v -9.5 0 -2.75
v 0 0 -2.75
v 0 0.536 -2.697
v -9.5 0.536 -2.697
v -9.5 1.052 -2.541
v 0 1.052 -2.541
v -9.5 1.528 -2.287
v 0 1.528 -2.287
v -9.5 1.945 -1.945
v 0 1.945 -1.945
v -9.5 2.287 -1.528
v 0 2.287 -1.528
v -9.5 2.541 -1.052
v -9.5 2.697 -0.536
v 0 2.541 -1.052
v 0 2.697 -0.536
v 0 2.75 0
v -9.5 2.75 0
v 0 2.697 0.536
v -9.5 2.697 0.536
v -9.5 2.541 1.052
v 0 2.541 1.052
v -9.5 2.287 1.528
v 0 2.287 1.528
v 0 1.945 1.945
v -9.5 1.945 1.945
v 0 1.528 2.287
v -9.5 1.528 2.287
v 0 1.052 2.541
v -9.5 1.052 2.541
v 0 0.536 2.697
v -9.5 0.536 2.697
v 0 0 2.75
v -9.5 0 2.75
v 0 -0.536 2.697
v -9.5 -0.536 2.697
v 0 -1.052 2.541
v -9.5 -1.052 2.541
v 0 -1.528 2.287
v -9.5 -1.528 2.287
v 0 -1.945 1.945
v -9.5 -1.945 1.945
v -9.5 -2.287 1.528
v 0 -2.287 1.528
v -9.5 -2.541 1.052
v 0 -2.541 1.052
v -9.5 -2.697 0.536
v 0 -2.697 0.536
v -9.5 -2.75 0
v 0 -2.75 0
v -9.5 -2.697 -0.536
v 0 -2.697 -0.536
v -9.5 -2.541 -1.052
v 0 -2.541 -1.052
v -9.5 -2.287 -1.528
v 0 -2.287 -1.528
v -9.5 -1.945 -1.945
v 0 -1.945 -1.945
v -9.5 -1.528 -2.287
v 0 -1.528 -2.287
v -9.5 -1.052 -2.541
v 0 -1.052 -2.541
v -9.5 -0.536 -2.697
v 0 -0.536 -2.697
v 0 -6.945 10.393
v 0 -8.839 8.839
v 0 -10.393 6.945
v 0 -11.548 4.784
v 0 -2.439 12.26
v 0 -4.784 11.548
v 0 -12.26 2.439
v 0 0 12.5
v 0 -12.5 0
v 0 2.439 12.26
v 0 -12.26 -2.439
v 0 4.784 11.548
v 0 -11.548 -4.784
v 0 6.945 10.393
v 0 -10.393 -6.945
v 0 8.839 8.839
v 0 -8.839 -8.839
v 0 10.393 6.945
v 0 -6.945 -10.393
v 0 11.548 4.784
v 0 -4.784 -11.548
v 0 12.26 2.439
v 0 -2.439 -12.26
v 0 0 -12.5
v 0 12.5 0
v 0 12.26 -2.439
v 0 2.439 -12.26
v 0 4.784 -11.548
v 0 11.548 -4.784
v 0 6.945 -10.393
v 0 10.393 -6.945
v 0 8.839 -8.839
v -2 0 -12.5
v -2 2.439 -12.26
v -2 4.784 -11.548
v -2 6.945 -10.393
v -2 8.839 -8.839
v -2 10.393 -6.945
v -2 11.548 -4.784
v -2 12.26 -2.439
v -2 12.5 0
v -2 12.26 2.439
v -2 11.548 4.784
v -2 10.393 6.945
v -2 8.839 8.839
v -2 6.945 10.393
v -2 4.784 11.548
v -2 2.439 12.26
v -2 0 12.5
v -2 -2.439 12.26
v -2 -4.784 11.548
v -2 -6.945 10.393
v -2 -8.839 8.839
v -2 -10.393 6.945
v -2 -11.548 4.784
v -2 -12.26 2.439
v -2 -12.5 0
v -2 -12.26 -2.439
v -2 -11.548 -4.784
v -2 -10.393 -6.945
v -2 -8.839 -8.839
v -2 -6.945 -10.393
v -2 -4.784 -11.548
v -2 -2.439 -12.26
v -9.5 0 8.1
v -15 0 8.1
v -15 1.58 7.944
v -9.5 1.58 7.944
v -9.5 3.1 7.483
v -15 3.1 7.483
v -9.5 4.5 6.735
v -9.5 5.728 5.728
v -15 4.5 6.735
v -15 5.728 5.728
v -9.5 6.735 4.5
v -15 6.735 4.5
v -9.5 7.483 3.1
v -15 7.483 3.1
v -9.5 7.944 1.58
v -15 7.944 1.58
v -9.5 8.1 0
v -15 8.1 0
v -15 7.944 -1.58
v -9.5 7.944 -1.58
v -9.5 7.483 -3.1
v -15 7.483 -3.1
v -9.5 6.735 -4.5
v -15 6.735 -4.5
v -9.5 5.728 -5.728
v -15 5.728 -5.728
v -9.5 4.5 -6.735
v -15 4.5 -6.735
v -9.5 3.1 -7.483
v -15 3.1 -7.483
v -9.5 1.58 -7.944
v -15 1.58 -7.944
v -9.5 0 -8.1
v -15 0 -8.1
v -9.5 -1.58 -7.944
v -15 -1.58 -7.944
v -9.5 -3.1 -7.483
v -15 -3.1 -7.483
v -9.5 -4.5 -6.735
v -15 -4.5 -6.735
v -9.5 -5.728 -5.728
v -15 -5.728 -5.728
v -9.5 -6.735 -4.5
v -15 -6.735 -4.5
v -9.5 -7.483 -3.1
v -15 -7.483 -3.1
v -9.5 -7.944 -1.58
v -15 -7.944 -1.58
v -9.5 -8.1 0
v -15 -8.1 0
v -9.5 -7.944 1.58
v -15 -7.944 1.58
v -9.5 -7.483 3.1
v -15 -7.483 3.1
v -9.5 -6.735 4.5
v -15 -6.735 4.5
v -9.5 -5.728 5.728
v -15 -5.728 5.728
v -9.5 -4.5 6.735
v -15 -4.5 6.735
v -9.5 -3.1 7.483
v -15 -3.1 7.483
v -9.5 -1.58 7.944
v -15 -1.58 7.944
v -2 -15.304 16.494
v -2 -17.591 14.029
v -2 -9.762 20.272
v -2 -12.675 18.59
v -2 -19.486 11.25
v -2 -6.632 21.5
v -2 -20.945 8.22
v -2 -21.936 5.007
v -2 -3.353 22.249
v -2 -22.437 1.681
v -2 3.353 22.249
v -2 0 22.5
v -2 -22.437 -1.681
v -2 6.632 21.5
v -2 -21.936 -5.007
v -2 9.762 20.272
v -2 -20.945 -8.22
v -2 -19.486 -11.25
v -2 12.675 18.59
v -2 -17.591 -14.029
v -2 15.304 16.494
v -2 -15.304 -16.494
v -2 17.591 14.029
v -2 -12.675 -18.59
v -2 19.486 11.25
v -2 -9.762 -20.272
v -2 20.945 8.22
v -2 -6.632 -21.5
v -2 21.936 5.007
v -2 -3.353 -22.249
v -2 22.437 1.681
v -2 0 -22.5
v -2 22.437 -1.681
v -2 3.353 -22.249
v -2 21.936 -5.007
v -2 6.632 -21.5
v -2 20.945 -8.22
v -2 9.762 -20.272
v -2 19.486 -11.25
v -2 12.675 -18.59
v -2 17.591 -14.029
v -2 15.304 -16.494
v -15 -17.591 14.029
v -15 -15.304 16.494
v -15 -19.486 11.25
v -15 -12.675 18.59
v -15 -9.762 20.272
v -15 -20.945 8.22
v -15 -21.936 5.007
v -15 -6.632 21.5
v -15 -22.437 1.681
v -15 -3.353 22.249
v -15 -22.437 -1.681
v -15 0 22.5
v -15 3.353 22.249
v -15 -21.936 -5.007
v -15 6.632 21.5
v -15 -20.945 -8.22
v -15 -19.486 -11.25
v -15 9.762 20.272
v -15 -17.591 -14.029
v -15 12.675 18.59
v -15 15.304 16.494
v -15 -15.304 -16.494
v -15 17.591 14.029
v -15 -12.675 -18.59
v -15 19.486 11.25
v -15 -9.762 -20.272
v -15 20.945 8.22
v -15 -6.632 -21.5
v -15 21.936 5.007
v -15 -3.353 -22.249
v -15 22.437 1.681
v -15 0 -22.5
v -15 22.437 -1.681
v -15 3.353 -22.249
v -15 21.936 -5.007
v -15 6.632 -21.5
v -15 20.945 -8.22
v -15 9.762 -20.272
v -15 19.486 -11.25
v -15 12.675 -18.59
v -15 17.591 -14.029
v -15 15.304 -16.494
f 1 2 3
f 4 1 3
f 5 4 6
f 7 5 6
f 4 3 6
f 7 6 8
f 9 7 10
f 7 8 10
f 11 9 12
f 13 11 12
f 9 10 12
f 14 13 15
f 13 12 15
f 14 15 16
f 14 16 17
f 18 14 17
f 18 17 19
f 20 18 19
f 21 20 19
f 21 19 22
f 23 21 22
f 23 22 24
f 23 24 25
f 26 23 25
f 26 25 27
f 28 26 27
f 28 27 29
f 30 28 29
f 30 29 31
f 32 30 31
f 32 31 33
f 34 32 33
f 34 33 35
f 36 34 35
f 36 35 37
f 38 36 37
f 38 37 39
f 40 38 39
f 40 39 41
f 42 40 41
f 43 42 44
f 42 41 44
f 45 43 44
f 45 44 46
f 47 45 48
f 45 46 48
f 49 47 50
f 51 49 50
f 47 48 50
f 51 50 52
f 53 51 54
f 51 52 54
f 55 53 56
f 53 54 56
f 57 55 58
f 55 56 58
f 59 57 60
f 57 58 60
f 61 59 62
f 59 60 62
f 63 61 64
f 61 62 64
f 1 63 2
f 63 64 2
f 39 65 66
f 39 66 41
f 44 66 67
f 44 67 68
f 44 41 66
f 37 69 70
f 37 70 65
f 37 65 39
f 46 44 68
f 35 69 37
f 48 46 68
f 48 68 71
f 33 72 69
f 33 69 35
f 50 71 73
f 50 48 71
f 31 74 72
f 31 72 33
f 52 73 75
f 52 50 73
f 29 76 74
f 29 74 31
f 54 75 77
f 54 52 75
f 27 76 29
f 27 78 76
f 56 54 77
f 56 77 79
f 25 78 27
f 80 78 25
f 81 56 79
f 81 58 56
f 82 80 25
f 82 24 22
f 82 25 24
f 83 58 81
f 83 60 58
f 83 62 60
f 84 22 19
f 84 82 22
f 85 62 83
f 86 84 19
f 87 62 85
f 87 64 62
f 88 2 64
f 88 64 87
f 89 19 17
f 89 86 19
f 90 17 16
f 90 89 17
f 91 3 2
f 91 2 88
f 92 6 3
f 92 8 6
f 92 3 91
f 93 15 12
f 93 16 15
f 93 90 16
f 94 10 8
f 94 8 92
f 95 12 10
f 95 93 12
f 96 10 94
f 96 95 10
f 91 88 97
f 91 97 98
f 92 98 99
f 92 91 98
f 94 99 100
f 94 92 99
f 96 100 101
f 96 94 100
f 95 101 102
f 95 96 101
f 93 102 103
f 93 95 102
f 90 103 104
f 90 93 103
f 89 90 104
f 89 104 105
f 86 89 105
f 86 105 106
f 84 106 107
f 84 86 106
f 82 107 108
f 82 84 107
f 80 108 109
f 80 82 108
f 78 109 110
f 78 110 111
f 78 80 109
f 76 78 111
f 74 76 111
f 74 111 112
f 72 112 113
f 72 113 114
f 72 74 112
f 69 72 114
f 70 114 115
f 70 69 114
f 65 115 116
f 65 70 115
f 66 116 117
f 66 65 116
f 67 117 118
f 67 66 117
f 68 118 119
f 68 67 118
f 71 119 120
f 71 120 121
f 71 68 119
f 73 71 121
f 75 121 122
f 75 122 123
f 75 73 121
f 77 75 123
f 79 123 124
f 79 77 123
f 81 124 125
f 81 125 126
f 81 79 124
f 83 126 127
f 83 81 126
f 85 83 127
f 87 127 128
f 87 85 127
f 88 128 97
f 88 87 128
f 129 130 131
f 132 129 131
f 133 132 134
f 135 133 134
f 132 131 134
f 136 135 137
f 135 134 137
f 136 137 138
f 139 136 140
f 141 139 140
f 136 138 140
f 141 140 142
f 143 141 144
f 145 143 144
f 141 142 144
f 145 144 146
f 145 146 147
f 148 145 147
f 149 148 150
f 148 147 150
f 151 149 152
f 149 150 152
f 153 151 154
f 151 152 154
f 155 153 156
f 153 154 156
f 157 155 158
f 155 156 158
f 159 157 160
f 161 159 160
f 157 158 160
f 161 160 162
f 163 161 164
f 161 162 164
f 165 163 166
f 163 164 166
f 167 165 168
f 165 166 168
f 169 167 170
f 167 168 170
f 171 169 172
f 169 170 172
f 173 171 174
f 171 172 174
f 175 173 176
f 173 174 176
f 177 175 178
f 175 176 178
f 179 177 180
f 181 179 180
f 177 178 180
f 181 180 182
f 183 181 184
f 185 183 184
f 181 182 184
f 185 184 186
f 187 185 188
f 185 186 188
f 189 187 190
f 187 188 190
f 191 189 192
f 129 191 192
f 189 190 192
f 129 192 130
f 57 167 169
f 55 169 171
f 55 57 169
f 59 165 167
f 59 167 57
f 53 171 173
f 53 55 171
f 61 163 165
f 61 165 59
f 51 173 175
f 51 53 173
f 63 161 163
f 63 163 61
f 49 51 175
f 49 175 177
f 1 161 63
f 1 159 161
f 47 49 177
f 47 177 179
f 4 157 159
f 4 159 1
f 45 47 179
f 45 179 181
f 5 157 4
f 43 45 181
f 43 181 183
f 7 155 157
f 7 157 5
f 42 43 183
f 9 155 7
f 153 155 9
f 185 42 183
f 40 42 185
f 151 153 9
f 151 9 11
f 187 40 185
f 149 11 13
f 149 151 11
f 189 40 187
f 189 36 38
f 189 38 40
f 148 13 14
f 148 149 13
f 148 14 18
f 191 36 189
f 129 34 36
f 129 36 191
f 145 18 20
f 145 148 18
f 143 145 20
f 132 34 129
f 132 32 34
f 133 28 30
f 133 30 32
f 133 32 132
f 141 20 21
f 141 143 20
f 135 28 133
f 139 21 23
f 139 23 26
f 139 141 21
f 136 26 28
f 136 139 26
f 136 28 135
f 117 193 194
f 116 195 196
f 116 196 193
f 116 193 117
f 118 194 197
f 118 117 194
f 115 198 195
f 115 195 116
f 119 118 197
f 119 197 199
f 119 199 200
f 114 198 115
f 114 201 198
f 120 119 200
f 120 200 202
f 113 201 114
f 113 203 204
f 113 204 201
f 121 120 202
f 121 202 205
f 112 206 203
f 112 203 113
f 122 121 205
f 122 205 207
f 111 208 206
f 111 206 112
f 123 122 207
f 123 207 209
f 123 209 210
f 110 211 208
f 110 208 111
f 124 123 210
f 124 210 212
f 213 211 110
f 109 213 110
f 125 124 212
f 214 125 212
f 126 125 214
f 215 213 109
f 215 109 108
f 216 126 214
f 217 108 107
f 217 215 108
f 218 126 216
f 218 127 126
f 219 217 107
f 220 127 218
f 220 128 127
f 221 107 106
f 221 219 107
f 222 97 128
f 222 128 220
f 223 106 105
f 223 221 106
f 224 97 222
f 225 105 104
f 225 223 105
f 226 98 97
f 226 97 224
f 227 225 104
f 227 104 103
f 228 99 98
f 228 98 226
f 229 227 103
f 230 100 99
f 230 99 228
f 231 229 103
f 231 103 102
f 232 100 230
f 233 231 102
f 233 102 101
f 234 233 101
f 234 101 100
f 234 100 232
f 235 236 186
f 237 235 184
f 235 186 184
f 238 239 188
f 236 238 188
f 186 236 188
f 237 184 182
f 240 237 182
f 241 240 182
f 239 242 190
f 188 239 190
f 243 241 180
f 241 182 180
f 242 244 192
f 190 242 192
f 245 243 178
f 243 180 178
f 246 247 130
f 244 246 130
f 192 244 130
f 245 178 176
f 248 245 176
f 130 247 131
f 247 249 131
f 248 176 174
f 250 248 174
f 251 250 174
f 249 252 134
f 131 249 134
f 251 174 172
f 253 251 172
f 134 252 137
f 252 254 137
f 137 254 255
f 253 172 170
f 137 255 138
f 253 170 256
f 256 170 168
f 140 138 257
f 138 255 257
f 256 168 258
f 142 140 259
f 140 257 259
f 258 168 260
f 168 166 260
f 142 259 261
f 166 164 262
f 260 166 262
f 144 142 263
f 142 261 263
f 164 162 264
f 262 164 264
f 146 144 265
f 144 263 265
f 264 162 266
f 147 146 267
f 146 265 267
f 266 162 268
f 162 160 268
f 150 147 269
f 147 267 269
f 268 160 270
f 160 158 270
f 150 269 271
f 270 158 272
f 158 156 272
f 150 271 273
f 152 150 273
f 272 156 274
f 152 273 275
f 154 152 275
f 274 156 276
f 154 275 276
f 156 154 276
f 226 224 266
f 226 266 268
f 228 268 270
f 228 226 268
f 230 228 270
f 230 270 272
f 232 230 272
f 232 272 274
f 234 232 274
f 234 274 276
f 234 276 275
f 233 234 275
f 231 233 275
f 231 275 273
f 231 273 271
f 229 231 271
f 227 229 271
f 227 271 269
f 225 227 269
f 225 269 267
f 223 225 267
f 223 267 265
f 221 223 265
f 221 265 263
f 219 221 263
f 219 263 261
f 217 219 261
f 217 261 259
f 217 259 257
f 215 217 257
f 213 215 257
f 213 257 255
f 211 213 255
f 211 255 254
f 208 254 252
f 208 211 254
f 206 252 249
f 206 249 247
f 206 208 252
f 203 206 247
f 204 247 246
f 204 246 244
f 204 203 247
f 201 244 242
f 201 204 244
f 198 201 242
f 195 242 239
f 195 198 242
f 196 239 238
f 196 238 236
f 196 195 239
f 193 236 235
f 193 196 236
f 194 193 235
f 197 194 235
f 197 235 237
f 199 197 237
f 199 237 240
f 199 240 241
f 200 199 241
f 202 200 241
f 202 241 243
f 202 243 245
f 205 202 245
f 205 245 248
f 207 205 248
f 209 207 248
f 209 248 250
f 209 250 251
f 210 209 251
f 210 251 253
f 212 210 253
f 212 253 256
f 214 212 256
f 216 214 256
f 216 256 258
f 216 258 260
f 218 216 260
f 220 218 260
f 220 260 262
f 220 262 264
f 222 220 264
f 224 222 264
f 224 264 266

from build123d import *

# Parameters (mm, degrees)
SKETCH1_R               = 22.5
BOSS_EXTRUDE1_DEPTH     = 15
SKETCH2_R               = 2.75
CUT_EXTRUDE1_DEPTH      = 36.178118199
SKETCH5_R               = 8.1
CUT_EXTRUDE2_DEPTH      = 5.5
SKETCH28_R              = 22.5
SKETCH28_R_2            = 12.5
CUT_EXTRUDE_THIN1_DEPTH = 2


with BuildPart() as part:
    # Sketch1 → Boss-Extrude1 (new body)
    with BuildSketch(Plane(origin=(0, 0, 0), x_dir=(0, 0, -1), z_dir=(1, 0, 0))):
        Circle(SKETCH1_R)
    extrude(amount=-BOSS_EXTRUDE1_DEPTH)

    # Sketch2 → Cut-Extrude1 (cut, through all)
    with BuildSketch(Plane(origin=(0, 0, 0), x_dir=(0, 0, -1), z_dir=(1, 0, 0))):
        Circle(SKETCH2_R)
    extrude(amount=-CUT_EXTRUDE1_DEPTH, mode=Mode.SUBTRACT)

    # Sketch5 → Cut-Extrude2 (cut)
    with BuildSketch(Plane.ZY.offset(15)):
        Circle(SKETCH5_R)
    extrude(amount=-CUT_EXTRUDE2_DEPTH, mode=Mode.SUBTRACT)

    # Sketch28 → Cut-Extrude-Thin1 (cut)
    with BuildSketch(Plane(origin=(0, 0, 0), x_dir=(0, 0, -1), z_dir=(1, 0, 0))):
        Circle(SKETCH28_R)
        Circle(SKETCH28_R_2, mode=Mode.SUBTRACT)
    extrude(amount=-CUT_EXTRUDE_THIN1_DEPTH, mode=Mode.SUBTRACT)


solid = part.part
